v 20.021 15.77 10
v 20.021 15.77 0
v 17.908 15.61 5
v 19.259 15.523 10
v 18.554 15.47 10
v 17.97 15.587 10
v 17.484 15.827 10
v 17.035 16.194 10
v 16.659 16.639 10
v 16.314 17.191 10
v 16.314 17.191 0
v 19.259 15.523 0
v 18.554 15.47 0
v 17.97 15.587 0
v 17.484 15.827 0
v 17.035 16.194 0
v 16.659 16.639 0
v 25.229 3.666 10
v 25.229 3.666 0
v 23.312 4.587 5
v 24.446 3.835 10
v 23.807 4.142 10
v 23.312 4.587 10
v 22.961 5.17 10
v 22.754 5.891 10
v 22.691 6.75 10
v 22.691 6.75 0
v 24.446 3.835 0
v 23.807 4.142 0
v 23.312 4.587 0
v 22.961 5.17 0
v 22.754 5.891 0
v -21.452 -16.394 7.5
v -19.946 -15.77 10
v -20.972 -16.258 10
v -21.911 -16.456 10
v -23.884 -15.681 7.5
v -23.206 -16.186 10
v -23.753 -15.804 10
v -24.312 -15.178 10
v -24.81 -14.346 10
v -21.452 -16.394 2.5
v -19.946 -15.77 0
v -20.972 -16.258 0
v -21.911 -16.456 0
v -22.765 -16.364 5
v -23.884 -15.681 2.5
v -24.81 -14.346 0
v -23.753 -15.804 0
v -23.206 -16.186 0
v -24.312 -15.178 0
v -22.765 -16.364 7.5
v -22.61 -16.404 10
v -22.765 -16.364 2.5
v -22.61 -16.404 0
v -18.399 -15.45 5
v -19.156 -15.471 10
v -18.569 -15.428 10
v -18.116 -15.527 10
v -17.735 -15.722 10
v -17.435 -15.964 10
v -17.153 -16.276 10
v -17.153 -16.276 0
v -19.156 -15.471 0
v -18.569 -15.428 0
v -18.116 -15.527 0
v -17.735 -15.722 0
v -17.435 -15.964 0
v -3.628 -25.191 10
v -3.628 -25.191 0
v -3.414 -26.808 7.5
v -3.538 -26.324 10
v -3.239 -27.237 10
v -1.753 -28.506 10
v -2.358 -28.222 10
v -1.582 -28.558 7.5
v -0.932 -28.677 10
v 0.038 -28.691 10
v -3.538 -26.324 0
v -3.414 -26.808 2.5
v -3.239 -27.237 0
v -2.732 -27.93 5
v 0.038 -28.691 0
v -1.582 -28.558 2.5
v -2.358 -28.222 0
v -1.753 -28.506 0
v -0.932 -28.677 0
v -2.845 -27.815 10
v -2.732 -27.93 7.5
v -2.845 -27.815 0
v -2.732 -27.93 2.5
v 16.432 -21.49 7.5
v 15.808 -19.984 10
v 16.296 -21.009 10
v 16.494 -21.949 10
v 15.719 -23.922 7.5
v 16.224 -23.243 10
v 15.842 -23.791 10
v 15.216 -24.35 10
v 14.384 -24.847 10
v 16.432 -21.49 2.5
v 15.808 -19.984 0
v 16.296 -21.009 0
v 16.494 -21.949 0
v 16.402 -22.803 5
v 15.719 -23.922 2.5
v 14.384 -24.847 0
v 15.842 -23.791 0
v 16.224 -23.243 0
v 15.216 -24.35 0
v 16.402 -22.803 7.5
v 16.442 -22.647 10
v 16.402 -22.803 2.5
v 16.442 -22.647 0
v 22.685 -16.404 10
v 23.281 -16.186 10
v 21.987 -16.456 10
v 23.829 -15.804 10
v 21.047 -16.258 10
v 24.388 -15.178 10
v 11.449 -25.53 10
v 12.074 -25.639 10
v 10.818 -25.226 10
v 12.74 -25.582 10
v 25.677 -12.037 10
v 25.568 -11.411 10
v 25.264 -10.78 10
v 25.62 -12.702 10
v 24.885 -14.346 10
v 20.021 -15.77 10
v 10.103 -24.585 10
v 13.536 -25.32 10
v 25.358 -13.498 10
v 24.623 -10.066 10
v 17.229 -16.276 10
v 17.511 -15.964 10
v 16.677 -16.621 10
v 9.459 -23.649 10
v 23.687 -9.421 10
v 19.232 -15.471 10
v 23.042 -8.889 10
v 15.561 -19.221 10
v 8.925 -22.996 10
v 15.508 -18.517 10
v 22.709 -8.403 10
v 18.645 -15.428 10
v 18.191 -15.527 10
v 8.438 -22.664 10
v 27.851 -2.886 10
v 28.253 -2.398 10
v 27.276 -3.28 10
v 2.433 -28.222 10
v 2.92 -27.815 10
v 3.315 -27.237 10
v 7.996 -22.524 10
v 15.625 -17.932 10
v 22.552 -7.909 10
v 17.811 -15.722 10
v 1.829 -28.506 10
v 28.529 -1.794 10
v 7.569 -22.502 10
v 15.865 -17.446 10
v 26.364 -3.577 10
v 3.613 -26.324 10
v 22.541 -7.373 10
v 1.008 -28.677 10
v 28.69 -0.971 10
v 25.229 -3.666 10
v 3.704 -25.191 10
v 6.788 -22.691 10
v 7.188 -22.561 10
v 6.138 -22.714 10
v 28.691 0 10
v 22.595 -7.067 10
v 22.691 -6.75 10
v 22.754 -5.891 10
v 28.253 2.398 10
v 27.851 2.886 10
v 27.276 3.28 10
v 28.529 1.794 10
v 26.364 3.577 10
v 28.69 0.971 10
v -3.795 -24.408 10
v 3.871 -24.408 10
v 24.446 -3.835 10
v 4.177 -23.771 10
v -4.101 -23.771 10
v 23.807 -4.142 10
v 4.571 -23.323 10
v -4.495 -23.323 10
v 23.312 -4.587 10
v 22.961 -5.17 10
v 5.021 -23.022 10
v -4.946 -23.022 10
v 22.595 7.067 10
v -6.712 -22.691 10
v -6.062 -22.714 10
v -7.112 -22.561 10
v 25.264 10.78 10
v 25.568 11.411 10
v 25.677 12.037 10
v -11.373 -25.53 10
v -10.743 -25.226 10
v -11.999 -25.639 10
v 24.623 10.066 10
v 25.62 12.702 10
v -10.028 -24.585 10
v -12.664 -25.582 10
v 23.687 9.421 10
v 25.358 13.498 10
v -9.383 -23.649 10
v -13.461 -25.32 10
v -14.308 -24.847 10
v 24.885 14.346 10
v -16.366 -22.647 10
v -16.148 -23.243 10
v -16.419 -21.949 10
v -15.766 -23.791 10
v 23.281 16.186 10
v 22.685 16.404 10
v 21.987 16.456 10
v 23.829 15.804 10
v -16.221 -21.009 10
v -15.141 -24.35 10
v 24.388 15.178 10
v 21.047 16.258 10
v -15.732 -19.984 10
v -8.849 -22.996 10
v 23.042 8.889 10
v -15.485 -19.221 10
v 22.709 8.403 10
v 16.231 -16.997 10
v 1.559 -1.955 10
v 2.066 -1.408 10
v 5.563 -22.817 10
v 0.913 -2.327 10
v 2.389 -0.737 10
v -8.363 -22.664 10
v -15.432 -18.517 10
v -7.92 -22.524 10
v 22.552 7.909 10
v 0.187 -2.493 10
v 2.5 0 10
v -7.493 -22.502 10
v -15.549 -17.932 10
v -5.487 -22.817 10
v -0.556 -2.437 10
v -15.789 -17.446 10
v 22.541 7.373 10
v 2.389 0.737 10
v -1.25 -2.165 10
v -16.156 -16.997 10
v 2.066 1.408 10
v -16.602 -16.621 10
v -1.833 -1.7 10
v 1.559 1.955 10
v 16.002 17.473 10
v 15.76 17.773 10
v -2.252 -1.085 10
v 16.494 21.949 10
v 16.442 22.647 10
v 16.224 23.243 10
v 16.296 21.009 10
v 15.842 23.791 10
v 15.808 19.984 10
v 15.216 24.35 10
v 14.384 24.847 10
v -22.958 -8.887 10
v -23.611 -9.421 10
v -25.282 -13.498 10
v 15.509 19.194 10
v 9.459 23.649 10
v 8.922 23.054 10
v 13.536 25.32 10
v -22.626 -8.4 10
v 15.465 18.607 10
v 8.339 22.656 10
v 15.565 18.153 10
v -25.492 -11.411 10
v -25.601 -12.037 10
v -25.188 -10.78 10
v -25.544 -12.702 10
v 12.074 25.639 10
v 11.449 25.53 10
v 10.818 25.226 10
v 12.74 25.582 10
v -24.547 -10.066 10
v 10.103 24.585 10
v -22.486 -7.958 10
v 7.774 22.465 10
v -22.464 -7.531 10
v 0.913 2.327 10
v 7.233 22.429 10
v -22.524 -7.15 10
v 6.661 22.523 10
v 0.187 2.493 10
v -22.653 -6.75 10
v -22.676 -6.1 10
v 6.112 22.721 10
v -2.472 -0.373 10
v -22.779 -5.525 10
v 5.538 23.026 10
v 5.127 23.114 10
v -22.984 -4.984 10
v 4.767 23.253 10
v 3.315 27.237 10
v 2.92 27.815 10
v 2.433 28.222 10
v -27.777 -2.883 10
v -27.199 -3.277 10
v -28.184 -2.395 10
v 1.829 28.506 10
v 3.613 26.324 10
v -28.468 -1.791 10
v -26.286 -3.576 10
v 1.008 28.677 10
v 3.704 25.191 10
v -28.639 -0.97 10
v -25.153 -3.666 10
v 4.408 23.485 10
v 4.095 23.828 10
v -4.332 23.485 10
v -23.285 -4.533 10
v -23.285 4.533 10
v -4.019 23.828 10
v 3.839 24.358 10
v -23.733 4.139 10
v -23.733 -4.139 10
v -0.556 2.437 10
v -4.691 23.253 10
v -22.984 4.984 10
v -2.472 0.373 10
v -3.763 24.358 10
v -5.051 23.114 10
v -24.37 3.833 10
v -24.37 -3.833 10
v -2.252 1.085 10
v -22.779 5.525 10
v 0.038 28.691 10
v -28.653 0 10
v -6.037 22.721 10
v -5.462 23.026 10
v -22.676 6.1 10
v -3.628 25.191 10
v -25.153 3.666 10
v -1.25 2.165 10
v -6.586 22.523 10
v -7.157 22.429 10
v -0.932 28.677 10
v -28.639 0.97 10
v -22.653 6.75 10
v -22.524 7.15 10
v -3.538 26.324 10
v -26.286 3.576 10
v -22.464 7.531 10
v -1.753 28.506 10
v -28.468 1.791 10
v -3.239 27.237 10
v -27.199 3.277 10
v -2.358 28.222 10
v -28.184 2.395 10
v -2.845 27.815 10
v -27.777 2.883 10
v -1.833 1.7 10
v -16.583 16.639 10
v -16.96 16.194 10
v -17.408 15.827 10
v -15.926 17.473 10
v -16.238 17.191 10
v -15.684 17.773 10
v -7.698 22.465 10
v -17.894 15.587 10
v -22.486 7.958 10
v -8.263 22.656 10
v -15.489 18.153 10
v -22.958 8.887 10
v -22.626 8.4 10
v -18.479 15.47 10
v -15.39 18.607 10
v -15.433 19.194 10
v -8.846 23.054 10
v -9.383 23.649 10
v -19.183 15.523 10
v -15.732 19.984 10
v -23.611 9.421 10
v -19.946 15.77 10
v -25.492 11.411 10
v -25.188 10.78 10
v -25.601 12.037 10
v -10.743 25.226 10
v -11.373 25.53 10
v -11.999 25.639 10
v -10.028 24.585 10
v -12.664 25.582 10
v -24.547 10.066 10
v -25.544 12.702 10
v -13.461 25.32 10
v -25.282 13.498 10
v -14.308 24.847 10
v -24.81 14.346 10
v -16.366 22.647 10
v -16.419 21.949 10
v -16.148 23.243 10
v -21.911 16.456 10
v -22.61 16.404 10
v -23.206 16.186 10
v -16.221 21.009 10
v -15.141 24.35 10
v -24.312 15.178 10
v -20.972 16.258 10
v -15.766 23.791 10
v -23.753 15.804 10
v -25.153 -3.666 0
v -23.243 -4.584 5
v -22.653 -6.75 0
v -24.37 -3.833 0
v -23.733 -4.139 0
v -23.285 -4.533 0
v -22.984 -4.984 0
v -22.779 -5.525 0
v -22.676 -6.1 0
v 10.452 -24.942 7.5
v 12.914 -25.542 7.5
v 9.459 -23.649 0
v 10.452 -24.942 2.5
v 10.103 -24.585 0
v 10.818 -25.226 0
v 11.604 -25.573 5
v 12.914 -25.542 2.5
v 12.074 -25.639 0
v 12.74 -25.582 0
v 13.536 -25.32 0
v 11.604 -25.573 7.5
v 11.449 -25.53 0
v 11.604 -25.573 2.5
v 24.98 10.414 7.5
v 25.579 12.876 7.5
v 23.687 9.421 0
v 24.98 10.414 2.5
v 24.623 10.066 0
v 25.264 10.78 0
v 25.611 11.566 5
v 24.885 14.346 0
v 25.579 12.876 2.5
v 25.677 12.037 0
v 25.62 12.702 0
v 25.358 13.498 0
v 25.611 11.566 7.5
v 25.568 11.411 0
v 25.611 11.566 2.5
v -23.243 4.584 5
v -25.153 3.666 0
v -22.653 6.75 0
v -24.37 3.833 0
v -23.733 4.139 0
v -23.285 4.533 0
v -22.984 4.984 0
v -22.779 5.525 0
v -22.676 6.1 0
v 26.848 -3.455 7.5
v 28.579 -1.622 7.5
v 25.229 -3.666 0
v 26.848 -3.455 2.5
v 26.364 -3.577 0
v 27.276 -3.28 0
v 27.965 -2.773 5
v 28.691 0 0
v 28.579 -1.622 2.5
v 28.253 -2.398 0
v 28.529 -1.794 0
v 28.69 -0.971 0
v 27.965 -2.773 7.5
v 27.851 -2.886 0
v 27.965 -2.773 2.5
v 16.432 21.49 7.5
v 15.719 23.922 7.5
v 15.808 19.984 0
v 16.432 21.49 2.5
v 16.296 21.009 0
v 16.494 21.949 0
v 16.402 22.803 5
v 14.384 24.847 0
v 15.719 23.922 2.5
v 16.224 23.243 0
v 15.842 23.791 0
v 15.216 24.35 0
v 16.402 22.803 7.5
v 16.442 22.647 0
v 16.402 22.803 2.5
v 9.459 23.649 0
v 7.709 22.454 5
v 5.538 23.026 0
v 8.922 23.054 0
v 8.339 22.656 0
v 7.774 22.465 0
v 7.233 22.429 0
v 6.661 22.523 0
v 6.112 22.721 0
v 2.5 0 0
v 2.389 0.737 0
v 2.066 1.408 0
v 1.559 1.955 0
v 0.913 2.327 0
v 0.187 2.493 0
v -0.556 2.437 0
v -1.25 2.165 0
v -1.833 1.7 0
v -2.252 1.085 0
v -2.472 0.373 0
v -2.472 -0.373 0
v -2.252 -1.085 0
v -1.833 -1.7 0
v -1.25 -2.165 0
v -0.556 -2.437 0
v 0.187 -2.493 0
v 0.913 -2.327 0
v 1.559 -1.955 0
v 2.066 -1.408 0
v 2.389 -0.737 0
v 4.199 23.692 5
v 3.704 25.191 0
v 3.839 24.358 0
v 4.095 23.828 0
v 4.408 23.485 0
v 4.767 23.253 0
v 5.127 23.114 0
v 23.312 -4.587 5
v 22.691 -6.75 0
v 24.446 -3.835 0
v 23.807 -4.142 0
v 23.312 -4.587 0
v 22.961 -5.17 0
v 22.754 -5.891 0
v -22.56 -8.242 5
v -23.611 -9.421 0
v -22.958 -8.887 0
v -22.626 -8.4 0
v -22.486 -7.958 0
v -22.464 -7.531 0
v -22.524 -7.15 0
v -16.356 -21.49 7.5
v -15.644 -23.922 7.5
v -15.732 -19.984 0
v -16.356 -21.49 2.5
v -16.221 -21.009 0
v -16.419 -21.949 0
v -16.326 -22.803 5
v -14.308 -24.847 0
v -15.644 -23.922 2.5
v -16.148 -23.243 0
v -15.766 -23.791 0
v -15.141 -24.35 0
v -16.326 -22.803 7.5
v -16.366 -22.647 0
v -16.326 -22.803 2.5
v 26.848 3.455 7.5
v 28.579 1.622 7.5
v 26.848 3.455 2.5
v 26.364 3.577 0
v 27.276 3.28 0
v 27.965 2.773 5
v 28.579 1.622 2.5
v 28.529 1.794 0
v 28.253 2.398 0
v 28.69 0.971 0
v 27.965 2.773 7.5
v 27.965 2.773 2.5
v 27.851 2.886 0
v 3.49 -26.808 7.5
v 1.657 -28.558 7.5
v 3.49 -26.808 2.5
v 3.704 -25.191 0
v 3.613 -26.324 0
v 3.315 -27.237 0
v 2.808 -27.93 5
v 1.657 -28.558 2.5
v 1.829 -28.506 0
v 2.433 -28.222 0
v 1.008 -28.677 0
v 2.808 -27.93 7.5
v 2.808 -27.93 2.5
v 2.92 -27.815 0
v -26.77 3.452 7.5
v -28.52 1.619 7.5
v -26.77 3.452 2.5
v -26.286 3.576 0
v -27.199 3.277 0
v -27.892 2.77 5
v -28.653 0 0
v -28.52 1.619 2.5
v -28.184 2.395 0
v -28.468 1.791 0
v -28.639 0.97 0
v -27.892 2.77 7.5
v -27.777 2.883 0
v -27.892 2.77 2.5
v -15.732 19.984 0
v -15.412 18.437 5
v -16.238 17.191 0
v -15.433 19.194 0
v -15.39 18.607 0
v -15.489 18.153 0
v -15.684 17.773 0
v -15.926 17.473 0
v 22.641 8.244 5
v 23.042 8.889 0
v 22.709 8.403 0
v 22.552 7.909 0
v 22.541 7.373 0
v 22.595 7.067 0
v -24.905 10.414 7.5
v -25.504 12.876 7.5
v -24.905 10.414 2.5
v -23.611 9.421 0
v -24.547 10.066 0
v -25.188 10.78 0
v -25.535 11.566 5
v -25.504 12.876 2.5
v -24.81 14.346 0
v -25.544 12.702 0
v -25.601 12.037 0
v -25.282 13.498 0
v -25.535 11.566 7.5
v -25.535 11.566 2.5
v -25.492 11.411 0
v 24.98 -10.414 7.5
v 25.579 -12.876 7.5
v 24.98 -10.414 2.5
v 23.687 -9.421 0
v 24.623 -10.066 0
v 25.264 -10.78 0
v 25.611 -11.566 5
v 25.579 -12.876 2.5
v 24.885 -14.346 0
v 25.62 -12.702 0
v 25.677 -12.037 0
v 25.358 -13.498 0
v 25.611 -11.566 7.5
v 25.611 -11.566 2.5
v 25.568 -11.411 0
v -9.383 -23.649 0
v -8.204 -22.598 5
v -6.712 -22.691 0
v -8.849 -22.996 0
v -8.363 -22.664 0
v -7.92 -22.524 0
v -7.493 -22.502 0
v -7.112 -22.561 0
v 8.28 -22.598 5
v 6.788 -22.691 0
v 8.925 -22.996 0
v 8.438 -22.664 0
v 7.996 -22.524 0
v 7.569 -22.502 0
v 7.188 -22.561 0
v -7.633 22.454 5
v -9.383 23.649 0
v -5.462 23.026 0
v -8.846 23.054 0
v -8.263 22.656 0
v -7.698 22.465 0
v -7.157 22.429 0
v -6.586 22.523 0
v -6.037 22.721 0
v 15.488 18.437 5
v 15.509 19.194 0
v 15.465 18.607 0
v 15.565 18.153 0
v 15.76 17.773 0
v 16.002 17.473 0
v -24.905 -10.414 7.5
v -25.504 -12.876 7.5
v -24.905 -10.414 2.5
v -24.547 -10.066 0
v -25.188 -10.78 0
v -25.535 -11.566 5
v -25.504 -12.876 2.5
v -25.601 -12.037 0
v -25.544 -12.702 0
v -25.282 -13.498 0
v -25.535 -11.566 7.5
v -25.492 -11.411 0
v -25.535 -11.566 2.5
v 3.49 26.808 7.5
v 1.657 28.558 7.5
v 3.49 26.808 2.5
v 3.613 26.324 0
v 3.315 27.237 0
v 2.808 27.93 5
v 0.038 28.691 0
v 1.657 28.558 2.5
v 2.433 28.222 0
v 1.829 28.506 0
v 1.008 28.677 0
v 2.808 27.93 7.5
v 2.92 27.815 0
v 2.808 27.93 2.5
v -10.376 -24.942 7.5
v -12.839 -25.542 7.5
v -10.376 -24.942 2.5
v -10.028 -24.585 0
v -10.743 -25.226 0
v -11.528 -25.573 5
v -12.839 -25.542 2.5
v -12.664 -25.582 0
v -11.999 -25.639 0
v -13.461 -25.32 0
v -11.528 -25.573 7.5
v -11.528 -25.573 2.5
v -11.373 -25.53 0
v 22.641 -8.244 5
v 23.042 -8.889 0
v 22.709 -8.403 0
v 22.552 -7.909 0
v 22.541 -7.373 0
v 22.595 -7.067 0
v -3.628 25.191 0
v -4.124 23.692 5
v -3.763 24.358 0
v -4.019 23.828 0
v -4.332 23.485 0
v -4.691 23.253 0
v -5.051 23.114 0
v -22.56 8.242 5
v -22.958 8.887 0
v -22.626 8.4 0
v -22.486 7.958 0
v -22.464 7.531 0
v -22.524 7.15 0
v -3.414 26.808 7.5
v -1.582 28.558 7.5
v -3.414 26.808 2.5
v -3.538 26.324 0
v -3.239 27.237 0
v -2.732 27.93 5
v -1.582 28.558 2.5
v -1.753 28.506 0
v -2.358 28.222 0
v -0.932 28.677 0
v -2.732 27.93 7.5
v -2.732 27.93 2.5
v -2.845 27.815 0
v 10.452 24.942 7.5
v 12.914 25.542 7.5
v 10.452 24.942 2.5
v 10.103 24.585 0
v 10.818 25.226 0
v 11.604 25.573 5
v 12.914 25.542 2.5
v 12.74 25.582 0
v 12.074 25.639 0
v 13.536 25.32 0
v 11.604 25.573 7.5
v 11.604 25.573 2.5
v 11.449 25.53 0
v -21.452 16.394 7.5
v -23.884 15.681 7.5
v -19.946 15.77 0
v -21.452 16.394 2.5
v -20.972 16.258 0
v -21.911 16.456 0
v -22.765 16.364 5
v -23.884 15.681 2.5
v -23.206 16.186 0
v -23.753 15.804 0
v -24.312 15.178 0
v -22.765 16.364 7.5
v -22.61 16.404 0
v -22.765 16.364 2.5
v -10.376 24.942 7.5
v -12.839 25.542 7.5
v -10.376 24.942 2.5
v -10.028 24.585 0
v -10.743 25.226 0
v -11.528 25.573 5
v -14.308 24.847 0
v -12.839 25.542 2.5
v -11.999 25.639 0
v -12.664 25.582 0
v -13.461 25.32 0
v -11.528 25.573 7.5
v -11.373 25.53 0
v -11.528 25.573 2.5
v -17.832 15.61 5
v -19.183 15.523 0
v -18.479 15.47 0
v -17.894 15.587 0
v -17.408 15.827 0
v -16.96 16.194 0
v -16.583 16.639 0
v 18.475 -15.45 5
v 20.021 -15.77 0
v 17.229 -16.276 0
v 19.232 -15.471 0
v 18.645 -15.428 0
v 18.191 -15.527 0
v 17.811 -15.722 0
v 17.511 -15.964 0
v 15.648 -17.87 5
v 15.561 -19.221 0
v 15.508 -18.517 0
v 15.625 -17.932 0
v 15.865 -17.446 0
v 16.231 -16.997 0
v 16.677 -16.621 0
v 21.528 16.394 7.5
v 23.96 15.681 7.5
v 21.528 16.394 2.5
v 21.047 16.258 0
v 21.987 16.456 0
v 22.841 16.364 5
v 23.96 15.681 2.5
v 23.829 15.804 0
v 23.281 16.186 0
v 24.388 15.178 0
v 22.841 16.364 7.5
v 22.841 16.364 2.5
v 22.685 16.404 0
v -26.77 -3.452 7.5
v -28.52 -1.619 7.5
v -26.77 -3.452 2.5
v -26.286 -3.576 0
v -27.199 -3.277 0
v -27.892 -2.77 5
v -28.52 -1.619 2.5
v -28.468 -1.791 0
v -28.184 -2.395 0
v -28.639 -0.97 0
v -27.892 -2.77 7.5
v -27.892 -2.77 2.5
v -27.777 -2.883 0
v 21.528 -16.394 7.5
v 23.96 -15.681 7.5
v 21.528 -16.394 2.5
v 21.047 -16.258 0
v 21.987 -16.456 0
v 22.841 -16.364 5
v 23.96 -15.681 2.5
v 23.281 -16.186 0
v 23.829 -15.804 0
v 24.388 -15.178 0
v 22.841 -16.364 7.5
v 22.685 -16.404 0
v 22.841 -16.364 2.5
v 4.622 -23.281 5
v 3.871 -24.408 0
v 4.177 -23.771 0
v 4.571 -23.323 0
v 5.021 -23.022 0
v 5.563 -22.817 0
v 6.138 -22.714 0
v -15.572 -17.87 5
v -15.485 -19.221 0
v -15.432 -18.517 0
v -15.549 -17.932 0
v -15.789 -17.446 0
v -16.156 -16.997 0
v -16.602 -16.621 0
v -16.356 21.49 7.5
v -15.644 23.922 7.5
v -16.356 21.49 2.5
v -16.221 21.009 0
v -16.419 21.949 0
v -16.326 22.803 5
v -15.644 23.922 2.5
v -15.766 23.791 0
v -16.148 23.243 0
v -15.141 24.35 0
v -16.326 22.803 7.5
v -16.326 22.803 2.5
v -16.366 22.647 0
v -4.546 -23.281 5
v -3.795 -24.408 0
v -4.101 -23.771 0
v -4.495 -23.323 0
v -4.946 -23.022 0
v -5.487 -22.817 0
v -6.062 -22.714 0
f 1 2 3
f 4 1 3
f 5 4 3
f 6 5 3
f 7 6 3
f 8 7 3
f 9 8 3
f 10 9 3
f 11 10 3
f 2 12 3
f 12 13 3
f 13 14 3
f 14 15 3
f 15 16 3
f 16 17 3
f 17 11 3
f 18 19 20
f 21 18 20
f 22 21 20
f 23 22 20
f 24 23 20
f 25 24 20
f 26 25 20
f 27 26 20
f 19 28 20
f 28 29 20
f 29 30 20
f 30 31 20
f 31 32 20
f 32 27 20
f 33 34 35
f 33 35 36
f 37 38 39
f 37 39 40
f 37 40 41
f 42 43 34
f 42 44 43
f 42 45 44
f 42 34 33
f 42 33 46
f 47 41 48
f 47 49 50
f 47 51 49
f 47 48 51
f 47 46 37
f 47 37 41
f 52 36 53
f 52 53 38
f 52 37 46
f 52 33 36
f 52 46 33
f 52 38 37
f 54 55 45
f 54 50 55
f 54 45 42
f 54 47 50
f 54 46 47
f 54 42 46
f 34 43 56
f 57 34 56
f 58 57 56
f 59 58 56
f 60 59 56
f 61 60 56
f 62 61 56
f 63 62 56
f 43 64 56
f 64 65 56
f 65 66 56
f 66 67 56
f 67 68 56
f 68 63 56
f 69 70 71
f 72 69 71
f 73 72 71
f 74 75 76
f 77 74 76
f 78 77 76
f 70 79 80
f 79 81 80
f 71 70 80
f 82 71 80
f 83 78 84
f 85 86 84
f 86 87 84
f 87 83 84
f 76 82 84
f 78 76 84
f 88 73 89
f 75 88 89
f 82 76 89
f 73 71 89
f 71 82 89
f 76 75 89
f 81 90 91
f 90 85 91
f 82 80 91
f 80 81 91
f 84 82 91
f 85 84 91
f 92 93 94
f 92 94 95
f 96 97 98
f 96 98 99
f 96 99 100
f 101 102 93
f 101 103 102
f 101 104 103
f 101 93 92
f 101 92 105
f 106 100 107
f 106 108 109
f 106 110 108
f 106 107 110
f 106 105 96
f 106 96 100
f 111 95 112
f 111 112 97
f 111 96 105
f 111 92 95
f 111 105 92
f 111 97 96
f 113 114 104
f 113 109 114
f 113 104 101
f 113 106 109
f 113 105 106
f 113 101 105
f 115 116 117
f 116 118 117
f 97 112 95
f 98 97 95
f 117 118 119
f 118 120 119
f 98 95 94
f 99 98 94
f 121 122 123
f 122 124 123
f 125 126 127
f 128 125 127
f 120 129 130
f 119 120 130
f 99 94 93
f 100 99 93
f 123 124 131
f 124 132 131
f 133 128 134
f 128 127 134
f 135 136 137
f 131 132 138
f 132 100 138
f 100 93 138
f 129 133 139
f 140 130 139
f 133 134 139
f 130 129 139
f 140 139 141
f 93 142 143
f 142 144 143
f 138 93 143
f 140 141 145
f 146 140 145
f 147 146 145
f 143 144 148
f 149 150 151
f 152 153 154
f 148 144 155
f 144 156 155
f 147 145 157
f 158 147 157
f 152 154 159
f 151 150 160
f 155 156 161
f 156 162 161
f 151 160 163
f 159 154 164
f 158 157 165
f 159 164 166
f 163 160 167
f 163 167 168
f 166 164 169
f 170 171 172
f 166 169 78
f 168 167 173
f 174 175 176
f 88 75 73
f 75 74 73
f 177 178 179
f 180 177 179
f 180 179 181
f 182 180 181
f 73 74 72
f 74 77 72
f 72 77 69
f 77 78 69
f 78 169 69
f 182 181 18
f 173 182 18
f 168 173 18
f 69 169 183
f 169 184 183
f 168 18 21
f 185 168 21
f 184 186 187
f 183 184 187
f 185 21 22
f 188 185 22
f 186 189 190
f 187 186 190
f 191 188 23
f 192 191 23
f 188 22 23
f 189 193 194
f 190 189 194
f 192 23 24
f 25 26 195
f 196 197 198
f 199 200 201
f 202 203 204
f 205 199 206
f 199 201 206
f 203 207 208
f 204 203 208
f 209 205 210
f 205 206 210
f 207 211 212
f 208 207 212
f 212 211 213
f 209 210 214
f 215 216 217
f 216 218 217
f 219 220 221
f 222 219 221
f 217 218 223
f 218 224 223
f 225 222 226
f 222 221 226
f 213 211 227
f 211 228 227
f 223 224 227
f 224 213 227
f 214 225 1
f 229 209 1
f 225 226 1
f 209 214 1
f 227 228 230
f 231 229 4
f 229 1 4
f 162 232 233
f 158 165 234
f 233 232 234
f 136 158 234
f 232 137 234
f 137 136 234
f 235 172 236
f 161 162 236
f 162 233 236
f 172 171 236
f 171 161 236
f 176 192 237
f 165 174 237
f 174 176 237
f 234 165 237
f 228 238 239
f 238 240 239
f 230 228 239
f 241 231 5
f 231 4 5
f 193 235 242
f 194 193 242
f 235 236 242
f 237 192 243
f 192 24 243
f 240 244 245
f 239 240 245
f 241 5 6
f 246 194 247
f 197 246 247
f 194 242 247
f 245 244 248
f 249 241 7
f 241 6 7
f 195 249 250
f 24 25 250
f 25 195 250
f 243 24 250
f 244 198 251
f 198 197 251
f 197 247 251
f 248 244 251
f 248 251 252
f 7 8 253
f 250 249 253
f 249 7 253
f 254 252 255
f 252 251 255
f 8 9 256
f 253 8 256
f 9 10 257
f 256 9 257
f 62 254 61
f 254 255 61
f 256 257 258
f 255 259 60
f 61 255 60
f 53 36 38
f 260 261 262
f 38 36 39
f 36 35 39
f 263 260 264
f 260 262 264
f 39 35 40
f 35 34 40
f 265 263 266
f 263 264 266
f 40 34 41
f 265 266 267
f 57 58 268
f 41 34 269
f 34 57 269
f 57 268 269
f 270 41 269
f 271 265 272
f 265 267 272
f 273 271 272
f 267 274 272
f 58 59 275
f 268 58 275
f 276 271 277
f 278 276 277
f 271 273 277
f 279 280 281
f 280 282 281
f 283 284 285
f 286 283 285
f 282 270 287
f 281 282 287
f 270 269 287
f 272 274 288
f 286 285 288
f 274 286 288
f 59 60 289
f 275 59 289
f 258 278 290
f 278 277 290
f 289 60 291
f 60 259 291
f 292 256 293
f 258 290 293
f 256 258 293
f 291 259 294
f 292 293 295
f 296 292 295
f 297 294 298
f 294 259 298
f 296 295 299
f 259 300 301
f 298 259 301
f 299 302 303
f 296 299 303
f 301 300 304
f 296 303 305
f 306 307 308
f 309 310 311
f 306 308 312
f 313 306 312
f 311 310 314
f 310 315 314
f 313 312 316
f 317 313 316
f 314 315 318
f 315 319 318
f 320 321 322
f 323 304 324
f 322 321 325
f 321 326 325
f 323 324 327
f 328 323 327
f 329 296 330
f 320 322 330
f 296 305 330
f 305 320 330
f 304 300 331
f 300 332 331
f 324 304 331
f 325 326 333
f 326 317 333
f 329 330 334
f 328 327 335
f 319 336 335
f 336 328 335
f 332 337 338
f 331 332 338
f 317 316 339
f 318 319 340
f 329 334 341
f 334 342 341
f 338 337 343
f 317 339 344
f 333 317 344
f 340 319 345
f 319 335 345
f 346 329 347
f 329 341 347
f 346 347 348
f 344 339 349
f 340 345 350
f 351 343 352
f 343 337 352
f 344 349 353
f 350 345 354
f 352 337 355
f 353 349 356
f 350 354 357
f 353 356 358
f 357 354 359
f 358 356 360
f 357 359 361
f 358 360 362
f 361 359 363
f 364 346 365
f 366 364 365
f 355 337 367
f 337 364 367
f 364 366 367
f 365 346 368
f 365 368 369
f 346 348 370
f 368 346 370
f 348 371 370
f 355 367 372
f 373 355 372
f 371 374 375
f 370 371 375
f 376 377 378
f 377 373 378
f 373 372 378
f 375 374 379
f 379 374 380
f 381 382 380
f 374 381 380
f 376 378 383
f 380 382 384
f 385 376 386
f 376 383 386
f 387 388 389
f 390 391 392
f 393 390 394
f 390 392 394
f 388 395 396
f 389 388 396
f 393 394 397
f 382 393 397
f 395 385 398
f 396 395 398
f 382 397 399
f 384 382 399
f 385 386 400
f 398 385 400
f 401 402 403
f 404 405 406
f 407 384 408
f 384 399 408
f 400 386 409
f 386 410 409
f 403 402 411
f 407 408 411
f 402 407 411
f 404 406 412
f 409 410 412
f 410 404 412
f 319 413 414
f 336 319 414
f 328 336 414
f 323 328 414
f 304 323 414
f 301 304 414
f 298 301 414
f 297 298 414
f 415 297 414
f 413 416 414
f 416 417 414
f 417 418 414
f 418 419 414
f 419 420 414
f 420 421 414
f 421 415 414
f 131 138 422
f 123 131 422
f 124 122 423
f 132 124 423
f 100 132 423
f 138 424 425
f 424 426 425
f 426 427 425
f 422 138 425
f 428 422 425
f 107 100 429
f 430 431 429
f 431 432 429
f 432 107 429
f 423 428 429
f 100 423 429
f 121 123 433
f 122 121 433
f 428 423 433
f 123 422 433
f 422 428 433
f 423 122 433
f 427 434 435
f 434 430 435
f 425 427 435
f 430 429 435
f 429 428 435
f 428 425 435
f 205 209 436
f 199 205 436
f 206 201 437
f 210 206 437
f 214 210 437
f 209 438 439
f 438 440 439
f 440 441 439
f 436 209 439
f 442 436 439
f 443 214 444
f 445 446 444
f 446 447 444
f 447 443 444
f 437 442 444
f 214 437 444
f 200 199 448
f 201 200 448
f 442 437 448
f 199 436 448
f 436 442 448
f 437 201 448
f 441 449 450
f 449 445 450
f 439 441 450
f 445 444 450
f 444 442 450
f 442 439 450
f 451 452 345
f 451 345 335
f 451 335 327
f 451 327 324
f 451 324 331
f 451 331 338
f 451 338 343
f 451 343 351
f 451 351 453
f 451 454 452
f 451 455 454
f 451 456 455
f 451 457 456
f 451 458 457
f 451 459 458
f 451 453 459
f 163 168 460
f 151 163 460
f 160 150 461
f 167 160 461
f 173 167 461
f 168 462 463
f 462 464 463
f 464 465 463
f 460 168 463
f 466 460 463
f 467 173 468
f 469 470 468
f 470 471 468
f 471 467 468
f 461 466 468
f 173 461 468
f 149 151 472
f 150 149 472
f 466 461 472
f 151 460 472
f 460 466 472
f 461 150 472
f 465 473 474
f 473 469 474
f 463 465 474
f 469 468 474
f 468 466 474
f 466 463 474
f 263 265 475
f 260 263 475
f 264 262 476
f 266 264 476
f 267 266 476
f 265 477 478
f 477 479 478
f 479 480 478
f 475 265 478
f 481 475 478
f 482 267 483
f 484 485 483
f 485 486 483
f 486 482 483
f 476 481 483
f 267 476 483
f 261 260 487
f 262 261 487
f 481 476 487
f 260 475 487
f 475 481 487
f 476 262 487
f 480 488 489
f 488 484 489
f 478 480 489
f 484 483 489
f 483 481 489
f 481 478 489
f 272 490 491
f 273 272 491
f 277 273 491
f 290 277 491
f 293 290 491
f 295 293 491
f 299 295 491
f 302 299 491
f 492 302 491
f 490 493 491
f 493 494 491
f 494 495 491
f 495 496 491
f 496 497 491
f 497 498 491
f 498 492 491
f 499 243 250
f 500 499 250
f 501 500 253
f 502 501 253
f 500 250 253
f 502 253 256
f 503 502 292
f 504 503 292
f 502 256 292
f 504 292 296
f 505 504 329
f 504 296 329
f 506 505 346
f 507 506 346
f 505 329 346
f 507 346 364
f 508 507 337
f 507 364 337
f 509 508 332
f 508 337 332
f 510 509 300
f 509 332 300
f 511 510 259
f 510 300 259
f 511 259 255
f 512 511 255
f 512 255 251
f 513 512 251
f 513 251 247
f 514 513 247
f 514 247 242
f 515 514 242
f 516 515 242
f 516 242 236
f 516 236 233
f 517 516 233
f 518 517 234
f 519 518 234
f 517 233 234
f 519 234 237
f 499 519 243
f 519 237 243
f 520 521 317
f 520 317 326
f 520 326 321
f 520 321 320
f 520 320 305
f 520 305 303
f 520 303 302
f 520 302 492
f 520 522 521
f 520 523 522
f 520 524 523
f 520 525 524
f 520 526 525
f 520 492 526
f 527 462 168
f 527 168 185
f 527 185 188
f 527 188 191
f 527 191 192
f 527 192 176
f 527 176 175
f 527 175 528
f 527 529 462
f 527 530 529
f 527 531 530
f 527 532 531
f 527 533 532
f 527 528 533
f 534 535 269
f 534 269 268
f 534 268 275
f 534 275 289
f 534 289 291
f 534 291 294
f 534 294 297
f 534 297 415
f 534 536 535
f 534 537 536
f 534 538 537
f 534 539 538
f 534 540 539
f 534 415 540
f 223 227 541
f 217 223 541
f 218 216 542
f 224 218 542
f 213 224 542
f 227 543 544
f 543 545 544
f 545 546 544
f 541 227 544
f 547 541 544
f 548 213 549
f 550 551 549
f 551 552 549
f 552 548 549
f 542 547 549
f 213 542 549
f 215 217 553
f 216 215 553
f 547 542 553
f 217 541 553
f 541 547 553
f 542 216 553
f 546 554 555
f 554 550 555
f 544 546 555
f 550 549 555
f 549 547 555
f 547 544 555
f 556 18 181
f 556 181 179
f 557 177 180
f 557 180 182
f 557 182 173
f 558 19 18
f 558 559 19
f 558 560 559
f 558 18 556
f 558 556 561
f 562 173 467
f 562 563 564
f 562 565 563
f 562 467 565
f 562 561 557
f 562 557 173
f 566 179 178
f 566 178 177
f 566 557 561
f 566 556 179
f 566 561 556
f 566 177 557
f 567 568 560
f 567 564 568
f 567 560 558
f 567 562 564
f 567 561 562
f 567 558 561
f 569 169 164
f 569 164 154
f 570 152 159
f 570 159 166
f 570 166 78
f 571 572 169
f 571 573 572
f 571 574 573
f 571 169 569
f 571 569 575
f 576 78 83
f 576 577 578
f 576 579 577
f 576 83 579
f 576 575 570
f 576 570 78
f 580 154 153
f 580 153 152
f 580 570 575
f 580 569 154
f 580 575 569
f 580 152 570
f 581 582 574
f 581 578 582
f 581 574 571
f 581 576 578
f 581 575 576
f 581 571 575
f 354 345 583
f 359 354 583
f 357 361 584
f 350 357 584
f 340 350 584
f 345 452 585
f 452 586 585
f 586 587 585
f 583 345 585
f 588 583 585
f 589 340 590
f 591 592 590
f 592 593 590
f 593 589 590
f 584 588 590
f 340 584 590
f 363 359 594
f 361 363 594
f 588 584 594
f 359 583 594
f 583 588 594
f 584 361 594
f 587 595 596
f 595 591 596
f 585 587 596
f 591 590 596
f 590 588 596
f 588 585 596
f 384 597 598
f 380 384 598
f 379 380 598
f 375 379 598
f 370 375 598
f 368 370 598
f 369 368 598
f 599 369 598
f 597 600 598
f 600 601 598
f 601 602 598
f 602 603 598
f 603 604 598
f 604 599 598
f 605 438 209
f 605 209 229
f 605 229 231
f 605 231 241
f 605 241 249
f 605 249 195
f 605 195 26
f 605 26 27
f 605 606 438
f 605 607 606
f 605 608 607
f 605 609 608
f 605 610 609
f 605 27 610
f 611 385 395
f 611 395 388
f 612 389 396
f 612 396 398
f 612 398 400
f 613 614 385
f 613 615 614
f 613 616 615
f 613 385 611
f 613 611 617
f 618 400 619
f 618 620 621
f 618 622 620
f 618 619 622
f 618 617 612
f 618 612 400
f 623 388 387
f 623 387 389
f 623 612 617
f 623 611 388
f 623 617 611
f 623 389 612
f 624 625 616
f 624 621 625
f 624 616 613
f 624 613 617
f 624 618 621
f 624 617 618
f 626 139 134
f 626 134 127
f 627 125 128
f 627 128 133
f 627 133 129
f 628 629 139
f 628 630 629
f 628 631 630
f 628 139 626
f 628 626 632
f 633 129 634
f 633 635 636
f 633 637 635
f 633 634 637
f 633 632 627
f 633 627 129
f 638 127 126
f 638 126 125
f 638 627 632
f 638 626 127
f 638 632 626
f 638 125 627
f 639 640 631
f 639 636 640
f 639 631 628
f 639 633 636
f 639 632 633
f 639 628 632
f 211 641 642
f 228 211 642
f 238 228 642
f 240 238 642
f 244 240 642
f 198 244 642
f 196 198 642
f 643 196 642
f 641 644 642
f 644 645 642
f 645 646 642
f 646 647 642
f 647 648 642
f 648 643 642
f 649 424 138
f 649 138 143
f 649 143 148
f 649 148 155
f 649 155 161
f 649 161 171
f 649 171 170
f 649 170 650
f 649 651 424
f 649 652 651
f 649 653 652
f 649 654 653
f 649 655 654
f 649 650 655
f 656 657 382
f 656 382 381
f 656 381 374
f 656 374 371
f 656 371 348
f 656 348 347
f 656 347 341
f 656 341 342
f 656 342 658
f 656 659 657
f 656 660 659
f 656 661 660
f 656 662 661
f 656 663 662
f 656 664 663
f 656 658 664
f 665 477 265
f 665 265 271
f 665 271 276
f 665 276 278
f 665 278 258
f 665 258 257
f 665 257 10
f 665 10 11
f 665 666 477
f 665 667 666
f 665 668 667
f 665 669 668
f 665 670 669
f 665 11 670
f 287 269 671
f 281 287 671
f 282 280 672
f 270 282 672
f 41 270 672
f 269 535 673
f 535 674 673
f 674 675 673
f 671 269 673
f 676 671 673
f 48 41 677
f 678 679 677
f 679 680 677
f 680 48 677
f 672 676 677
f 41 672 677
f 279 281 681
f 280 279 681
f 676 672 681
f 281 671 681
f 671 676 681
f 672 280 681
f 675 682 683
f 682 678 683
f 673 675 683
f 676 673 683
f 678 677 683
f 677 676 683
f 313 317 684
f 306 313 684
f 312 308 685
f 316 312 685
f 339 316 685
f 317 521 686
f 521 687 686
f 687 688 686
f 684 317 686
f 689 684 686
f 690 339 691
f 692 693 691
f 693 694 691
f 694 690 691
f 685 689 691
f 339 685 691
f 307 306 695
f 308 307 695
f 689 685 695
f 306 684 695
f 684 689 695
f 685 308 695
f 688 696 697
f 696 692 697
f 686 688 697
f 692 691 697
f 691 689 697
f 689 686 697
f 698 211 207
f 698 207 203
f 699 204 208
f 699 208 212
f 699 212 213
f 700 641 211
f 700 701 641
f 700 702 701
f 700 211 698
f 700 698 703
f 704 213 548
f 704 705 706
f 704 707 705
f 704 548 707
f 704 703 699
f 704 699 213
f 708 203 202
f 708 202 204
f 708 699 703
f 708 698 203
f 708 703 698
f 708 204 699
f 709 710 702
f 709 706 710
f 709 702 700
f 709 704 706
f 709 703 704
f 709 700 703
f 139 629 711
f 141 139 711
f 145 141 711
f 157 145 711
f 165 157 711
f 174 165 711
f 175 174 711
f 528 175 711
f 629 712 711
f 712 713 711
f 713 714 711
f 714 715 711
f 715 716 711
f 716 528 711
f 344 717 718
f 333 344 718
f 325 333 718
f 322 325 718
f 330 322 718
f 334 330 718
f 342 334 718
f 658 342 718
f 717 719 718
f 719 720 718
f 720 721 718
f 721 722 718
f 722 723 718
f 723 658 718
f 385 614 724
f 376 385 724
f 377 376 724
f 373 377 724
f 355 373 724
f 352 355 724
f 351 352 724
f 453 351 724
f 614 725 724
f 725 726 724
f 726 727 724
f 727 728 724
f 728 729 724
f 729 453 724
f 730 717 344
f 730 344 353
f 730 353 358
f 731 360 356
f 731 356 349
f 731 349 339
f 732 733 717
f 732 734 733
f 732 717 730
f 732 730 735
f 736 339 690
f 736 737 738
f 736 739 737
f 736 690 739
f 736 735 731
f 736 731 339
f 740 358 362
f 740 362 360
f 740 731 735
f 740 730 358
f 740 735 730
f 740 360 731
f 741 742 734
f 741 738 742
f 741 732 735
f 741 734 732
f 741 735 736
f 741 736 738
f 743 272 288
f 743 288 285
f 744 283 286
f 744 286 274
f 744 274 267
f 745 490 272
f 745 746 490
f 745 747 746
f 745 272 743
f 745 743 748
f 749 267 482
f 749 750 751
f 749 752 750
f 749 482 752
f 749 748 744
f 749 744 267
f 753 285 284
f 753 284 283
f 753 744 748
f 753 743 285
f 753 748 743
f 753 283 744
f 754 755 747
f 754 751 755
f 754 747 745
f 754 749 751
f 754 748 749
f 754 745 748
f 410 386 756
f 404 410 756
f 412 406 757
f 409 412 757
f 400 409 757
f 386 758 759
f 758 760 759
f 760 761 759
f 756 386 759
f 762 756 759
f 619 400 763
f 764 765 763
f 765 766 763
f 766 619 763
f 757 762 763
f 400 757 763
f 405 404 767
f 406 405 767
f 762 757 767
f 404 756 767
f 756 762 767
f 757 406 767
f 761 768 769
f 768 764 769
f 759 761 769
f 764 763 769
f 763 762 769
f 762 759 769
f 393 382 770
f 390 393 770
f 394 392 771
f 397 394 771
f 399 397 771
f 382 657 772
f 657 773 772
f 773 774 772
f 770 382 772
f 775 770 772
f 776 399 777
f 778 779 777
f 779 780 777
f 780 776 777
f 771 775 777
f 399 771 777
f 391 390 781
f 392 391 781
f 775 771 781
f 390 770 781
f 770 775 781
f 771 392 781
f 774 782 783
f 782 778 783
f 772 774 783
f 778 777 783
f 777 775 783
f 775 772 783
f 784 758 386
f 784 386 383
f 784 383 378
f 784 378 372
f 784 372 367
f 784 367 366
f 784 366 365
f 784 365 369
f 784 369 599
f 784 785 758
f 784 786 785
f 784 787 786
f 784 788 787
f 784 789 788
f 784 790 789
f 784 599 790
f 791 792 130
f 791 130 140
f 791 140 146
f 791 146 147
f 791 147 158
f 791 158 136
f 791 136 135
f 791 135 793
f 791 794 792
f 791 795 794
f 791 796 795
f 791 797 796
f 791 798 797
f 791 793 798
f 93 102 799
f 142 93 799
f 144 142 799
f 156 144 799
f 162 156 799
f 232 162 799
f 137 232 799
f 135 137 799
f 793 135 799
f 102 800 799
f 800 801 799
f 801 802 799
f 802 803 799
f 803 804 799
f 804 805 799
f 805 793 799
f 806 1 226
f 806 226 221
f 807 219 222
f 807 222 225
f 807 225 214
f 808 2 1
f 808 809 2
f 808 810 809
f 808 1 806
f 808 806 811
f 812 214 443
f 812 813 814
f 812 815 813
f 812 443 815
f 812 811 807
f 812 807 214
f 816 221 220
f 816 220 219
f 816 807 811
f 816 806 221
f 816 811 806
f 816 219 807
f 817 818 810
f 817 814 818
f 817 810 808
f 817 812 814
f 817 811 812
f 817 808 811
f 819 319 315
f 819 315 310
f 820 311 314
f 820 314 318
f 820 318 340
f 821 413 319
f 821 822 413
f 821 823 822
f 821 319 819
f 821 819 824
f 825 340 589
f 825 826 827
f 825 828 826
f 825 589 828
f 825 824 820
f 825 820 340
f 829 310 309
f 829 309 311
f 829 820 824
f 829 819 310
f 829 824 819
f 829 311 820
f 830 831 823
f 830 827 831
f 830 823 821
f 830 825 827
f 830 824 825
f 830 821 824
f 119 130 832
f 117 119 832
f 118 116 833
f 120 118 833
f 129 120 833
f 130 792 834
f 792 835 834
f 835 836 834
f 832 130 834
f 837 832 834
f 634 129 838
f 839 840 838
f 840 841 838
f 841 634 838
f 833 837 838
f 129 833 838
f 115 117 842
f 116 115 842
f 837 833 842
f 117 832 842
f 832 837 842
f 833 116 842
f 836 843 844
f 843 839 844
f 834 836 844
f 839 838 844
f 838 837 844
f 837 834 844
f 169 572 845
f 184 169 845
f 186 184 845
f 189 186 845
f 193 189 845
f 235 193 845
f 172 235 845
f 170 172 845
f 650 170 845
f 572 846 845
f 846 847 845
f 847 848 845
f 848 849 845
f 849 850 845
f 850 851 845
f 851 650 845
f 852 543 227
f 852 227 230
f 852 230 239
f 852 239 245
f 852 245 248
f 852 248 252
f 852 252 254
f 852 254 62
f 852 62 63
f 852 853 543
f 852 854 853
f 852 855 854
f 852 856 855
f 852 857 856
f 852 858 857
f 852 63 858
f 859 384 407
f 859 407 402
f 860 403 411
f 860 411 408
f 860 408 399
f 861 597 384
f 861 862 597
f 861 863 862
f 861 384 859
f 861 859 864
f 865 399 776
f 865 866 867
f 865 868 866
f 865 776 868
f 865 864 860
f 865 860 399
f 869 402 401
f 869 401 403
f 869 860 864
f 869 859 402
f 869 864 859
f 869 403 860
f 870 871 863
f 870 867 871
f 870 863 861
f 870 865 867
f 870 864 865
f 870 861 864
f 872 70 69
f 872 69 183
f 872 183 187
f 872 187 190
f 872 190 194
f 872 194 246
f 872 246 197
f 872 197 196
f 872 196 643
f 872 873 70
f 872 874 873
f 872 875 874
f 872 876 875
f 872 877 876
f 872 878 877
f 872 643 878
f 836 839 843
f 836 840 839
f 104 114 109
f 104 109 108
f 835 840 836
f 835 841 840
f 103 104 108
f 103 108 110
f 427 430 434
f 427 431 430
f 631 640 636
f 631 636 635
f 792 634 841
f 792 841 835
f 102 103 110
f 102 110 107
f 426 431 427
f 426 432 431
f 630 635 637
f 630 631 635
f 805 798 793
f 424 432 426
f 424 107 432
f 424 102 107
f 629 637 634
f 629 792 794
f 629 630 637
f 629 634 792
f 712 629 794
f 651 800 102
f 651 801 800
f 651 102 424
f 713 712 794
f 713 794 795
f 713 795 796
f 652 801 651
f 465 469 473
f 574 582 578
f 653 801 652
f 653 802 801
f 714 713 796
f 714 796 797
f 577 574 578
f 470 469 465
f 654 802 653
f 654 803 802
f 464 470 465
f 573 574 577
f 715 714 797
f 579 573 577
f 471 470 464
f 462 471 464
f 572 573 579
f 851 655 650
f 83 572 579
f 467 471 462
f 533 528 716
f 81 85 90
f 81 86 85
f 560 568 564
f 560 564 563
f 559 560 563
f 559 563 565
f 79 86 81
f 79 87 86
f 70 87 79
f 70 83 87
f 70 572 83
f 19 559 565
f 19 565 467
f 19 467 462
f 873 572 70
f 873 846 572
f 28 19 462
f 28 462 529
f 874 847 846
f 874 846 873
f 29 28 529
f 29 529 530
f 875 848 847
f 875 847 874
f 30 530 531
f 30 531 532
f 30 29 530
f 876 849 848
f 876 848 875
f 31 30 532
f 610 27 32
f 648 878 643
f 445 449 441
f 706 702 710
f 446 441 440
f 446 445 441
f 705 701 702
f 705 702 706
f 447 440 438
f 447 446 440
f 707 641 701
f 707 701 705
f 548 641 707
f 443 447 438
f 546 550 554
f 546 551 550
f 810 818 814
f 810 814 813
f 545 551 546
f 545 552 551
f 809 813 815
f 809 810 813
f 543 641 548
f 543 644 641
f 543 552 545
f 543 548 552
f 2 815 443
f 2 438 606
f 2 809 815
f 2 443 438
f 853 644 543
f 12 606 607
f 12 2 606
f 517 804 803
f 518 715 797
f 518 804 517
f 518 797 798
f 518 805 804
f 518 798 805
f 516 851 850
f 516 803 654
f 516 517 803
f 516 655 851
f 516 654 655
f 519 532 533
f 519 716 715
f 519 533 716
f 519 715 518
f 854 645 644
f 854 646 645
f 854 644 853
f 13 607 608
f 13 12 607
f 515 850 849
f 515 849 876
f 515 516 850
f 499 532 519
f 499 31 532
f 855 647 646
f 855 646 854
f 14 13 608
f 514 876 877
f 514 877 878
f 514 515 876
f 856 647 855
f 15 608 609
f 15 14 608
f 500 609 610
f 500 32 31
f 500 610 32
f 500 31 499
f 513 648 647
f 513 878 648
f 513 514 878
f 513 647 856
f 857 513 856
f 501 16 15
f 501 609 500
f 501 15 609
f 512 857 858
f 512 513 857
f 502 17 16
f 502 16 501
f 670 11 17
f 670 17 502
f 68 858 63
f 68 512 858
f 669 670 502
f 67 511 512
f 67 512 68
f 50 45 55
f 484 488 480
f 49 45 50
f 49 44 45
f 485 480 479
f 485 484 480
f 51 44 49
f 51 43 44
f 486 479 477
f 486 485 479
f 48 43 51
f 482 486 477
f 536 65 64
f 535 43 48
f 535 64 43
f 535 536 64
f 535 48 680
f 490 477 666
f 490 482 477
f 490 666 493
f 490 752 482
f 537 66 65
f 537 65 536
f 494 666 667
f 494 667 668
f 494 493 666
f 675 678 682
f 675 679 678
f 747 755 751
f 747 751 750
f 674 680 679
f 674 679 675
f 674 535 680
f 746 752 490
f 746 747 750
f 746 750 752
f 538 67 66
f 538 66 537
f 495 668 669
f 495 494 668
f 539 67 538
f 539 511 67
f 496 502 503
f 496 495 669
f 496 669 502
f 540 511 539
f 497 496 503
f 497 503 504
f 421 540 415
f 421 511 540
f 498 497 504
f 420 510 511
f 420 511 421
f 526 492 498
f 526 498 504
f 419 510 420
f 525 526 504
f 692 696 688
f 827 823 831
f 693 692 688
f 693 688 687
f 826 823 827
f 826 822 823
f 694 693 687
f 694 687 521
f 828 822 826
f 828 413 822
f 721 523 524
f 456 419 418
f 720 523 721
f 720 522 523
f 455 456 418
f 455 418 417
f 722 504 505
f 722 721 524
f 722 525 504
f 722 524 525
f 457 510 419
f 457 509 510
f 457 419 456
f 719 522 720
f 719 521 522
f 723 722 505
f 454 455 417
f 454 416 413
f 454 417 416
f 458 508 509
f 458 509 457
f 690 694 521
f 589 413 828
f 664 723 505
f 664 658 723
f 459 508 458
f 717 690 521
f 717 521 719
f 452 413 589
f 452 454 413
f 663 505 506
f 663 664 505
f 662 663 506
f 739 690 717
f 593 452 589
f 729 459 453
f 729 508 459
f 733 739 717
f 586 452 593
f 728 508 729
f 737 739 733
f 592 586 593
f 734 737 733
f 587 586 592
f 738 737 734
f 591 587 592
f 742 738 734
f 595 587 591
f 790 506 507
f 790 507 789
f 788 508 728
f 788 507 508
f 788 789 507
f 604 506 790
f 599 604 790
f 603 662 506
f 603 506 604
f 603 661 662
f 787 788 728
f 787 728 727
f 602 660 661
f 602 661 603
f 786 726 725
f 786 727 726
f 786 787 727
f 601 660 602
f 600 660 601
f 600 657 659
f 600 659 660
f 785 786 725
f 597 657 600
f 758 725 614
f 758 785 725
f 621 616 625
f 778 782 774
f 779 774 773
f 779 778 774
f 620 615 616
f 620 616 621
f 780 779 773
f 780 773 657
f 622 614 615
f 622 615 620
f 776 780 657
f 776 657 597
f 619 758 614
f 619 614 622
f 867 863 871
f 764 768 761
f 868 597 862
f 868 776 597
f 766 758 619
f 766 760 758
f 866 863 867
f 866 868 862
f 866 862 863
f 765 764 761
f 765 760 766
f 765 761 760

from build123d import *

# Parameters (mm, degrees)
BOSS_EXTRUDE1_DEPTH = 10
SKETCH2_R           = 2.5
CUT_EXTRUDE1_DEPTH  = 10


with BuildPart() as part:
    # Sketch1 → Boss-Extrude1 (new body)
    with BuildSketch(Plane.XY):
        with BuildLine():
            add(Edge.make_bspline(
                [(20.021377374, 15.770240507), (23.228454767, 17.670297014), (24.885304572, 14.345671476)],
                knots=[0, 0, 0, 1, 1, 1], degree=2))
            add(Edge.make_bspline(
                [(23.687053943, 9.421102444), (26.936089844, 11.248484685), (24.885304572, 14.345671476)],
                knots=[0, 0, 0, 1, 1, 1], degree=2))
            add(Edge.make_bspline(
                [(23.687053943, 9.421102444), (22.092796181, 8.40320107), (22.691342951, 6.75)],
                knots=[0, 0, 0, 1, 1, 1], degree=2))
            add(Edge.make_bspline(
                [(25.229215659, 3.66567657), (22.664233629, 3.966024086), (22.691342951, 6.75)],
                knots=[0, 0, 0, 1, 1, 1], degree=2))
            add(Edge.make_bspline(
                [(25.229215659, 3.66567657), (28.97000579, 3.713913663), (28.691342951, 0)],
                knots=[0, 0, 0, 1, 1, 1], degree=2))
            add(Edge.make_bspline(
                [(25.229215659, -3.66567657), (28.97000579, -3.713913663), (28.691342951, 0)],
                knots=[0, 0, 0, 1, 1, 1], degree=2))
            add(Edge.make_bspline(
                [(25.229215659, -3.66567657), (22.664233629, -3.966024086), (22.691342951, -6.75)],
                knots=[0, 0, 0, 1, 1, 1], degree=2))
            add(Edge.make_bspline(
                [(23.687053943, -9.421102444), (22.092796181, -8.40320107), (22.691342951, -6.75)],
                knots=[0, 0, 0, 1, 1, 1], degree=2))
            add(Edge.make_bspline(
                [(23.687053943, -9.421102444), (26.936089844, -11.248484685), (24.885304572, -14.345671476)],
                knots=[0, 0, 0, 1, 1, 1], degree=2))
            add(Edge.make_bspline(
                [(20.021377374, -15.770240507), (23.228454767, -17.670297014), (24.885304572, -14.345671476)],
                knots=[0, 0, 0, 1, 1, 1], degree=2))
            add(Edge.make_bspline(
                [(20.021377374, -15.770240507), (18.324240092, -14.876219604), (17.229215659, -16.276279442)],
                knots=[0, 0, 0, 1, 1, 1], degree=2))
            add(Edge.make_bspline(
                [(15.808113214, -19.983504666), (14.776936626, -17.60976644), (17.229215659, -16.276279442)],
                knots=[0, 0, 0, 1, 1, 1], degree=2))
            add(Edge.make_bspline(
                [(15.808113214, -19.983504666), (17.708169721, -23.19058206), (14.383544183, -24.847431864)],
                knots=[0, 0, 0, 1, 1, 1], degree=2))
            add(Edge.make_bspline(
                [(9.458975152, -23.649181236), (11.286357393, -26.898217136), (14.383544183, -24.847431864)],
                knots=[0, 0, 0, 1, 1, 1], degree=2))
            add(Edge.make_bspline(
                [(9.458975152, -23.649181236), (8.436221603, -22.026367781), (6.787872708, -22.691342951)],
                knots=[0, 0, 0, 1, 1, 1], degree=2))
            add(Edge.make_bspline(
                [(3.703549277, -25.191342951), (3.997393269, -22.620037051), (6.787872708, -22.691342951)],
                knots=[0, 0, 0, 1, 1, 1], degree=2))
            add(Edge.make_bspline(
                [(3.703549277, -25.191342951), (3.745507784, -28.918781699), (0.037872708, -28.691342951)],
                knots=[0, 0, 0, 1, 1, 1], degree=2))
            add(Edge.make_bspline(
                [(-3.627803862, -25.191342951), (-3.669762369, -28.918781699), (0.037872708, -28.691342951)],
                knots=[0, 0, 0, 1, 1, 1], degree=2))
            add(Edge.make_bspline(
                [(-3.627803862, -25.191342951), (-3.921647854, -22.620037051), (-6.712127292, -22.691342951)],
                knots=[0, 0, 0, 1, 1, 1], degree=2))
            add(Edge.make_bspline(
                [(-9.383229737, -23.649181236), (-8.360476188, -22.026367781), (-6.712127292, -22.691342951)],
                knots=[0, 0, 0, 1, 1, 1], degree=2))
            add(Edge.make_bspline(
                [(-9.383229737, -23.649181236), (-11.210611978, -26.898217136), (-14.307798768, -24.847431864)],
                knots=[0, 0, 0, 1, 1, 1], degree=2))
            add(Edge.make_bspline(
                [(-15.732367799, -19.983504666), (-17.632424306, -23.19058206), (-14.307798768, -24.847431864)],
                knots=[0, 0, 0, 1, 1, 1], degree=2))
            add(Edge.make_bspline(
                [(-15.732367799, -19.983504666), (-14.701191211, -17.60976644), (-17.153470244, -16.276279442)],
                knots=[0, 0, 0, 1, 1, 1], degree=2))
            add(Edge.make_bspline(
                [(-19.945631959, -15.770240507), (-18.248494677, -14.876219604), (-17.153470244, -16.276279442)],
                knots=[0, 0, 0, 1, 1, 1], degree=2))
            add(Edge.make_bspline(
                [(-19.945631959, -15.770240507), (-23.152709352, -17.670297014), (-24.809559157, -14.345671476)],
                knots=[0, 0, 0, 1, 1, 1], degree=2))
            add(Edge.make_bspline(
                [(-23.611308528, -9.421102444), (-26.860344428, -11.248484685), (-24.809559157, -14.345671476)],
                knots=[0, 0, 0, 1, 1, 1], degree=2))
            add(Edge.make_bspline(
                [(-23.611308528, -9.421102444), (-21.988495074, -8.398348896), (-22.653470244, -6.75)],
                knots=[0, 0, 0, 1, 1, 1], degree=2))
            add(Edge.make_bspline(
                [(-25.153470244, -3.66567657), (-22.582164343, -3.959520562), (-22.653470244, -6.75)],
                knots=[0, 0, 0, 1, 1, 1], degree=2))
            add(Edge.make_bspline(
                [(-25.153470244, -3.66567657), (-28.880908991, -3.707635076), (-28.653470244, 0)],
                knots=[0, 0, 0, 1, 1, 1], degree=2))
            add(Edge.make_bspline(
                [(-25.153470244, 3.66567657), (-28.880908991, 3.707635076), (-28.653470244, 0)],
                knots=[0, 0, 0, 1, 1, 1], degree=2))
            add(Edge.make_bspline(
                [(-25.153470244, 3.66567657), (-22.582164343, 3.959520562), (-22.653470244, 6.75)],
                knots=[0, 0, 0, 1, 1, 1], degree=2))
            add(Edge.make_bspline(
                [(-23.611308528, 9.421102444), (-21.988495074, 8.398348896), (-22.653470244, 6.75)],
                knots=[0, 0, 0, 1, 1, 1], degree=2))
            add(Edge.make_bspline(
                [(-23.611308528, 9.421102444), (-26.860344428, 11.248484685), (-24.809559157, 14.345671476)],
                knots=[0, 0, 0, 1, 1, 1], degree=2))
            add(Edge.make_bspline(
                [(-19.945631959, 15.770240507), (-23.152709352, 17.670297014), (-24.809559157, 14.345671476)],
                knots=[0, 0, 0, 1, 1, 1], degree=2))
            add(Edge.make_bspline(
                [(-19.945631959, 15.770240507), (-17.571893732, 14.739063919), (-16.238406734, 17.191342951)],
                knots=[0, 0, 0, 1, 1, 1], degree=2))
            add(Edge.make_bspline(
                [(-15.732367799, 19.983504666), (-14.838346896, 18.286367384), (-16.238406734, 17.191342951)],
                knots=[0, 0, 0, 1, 1, 1], degree=2))
            add(Edge.make_bspline(
                [(-15.732367799, 19.983504666), (-17.632424306, 23.19058206), (-14.307798768, 24.847431864)],
                knots=[0, 0, 0, 1, 1, 1], degree=2))
            add(Edge.make_bspline(
                [(-9.383229737, 23.649181236), (-11.210611978, 26.898217136), (-14.307798768, 24.847431864)],
                knots=[0, 0, 0, 1, 1, 1], degree=2))
            add(Edge.make_bspline(
                [(-9.383229737, 23.649181236), (-7.843100425, 21.569287002), (-5.462127292, 23.026279442)],
                knots=[0, 0, 0, 1, 1, 1], degree=2))
            add(Edge.make_bspline(
                [(-3.627803862, 25.191342951), (-3.70212769, 23.2745685), (-5.462127292, 23.026279442)],
                knots=[0, 0, 0, 1, 1, 1], degree=2))
            add(Edge.make_bspline(
                [(-3.627803862, 25.191342951), (-3.669762369, 28.918781699), (0.037872708, 28.691342951)],
                knots=[0, 0, 0, 1, 1, 1], degree=2))
            add(Edge.make_bspline(
                [(3.703549277, 25.191342951), (3.745507784, 28.918781699), (0.037872708, 28.691342951)],
                knots=[0, 0, 0, 1, 1, 1], degree=2))
            add(Edge.make_bspline(
                [(3.703549277, 25.191342951), (3.777873105, 23.2745685), (5.537872708, 23.026279442)],
                knots=[0, 0, 0, 1, 1, 1], degree=2))
            add(Edge.make_bspline(
                [(9.458975152, 23.649181236), (7.91884584, 21.569287002), (5.537872708, 23.026279442)],
                knots=[0, 0, 0, 1, 1, 1], degree=2))
            add(Edge.make_bspline(
                [(9.458975152, 23.649181236), (11.286357393, 26.898217136), (14.383544183, 24.847431864)],
                knots=[0, 0, 0, 1, 1, 1], degree=2))
            add(Edge.make_bspline(
                [(15.808113214, 19.983504666), (17.708169721, 23.19058206), (14.383544183, 24.847431864)],
                knots=[0, 0, 0, 1, 1, 1], degree=2))
            add(Edge.make_bspline(
                [(15.808113214, 19.983504666), (14.914092312, 18.286367384), (16.314152149, 17.191342951)],
                knots=[0, 0, 0, 1, 1, 1], degree=2))
            add(Edge.make_bspline(
                [(20.021377374, 15.770240507), (17.647639148, 14.739063919), (16.314152149, 17.191342951)],
                knots=[0, 0, 0, 1, 1, 1], degree=2))
        make_face()
    extrude(amount=BOSS_EXTRUDE1_DEPTH)

    # Sketch2 → Cut-Extrude1 (cut)
    with BuildSketch(Plane.XY.offset(10)):
        Circle(SKETCH2_R)
    extrude(amount=-CUT_EXTRUDE1_DEPTH, mode=Mode.SUBTRACT)


solid = part.part
